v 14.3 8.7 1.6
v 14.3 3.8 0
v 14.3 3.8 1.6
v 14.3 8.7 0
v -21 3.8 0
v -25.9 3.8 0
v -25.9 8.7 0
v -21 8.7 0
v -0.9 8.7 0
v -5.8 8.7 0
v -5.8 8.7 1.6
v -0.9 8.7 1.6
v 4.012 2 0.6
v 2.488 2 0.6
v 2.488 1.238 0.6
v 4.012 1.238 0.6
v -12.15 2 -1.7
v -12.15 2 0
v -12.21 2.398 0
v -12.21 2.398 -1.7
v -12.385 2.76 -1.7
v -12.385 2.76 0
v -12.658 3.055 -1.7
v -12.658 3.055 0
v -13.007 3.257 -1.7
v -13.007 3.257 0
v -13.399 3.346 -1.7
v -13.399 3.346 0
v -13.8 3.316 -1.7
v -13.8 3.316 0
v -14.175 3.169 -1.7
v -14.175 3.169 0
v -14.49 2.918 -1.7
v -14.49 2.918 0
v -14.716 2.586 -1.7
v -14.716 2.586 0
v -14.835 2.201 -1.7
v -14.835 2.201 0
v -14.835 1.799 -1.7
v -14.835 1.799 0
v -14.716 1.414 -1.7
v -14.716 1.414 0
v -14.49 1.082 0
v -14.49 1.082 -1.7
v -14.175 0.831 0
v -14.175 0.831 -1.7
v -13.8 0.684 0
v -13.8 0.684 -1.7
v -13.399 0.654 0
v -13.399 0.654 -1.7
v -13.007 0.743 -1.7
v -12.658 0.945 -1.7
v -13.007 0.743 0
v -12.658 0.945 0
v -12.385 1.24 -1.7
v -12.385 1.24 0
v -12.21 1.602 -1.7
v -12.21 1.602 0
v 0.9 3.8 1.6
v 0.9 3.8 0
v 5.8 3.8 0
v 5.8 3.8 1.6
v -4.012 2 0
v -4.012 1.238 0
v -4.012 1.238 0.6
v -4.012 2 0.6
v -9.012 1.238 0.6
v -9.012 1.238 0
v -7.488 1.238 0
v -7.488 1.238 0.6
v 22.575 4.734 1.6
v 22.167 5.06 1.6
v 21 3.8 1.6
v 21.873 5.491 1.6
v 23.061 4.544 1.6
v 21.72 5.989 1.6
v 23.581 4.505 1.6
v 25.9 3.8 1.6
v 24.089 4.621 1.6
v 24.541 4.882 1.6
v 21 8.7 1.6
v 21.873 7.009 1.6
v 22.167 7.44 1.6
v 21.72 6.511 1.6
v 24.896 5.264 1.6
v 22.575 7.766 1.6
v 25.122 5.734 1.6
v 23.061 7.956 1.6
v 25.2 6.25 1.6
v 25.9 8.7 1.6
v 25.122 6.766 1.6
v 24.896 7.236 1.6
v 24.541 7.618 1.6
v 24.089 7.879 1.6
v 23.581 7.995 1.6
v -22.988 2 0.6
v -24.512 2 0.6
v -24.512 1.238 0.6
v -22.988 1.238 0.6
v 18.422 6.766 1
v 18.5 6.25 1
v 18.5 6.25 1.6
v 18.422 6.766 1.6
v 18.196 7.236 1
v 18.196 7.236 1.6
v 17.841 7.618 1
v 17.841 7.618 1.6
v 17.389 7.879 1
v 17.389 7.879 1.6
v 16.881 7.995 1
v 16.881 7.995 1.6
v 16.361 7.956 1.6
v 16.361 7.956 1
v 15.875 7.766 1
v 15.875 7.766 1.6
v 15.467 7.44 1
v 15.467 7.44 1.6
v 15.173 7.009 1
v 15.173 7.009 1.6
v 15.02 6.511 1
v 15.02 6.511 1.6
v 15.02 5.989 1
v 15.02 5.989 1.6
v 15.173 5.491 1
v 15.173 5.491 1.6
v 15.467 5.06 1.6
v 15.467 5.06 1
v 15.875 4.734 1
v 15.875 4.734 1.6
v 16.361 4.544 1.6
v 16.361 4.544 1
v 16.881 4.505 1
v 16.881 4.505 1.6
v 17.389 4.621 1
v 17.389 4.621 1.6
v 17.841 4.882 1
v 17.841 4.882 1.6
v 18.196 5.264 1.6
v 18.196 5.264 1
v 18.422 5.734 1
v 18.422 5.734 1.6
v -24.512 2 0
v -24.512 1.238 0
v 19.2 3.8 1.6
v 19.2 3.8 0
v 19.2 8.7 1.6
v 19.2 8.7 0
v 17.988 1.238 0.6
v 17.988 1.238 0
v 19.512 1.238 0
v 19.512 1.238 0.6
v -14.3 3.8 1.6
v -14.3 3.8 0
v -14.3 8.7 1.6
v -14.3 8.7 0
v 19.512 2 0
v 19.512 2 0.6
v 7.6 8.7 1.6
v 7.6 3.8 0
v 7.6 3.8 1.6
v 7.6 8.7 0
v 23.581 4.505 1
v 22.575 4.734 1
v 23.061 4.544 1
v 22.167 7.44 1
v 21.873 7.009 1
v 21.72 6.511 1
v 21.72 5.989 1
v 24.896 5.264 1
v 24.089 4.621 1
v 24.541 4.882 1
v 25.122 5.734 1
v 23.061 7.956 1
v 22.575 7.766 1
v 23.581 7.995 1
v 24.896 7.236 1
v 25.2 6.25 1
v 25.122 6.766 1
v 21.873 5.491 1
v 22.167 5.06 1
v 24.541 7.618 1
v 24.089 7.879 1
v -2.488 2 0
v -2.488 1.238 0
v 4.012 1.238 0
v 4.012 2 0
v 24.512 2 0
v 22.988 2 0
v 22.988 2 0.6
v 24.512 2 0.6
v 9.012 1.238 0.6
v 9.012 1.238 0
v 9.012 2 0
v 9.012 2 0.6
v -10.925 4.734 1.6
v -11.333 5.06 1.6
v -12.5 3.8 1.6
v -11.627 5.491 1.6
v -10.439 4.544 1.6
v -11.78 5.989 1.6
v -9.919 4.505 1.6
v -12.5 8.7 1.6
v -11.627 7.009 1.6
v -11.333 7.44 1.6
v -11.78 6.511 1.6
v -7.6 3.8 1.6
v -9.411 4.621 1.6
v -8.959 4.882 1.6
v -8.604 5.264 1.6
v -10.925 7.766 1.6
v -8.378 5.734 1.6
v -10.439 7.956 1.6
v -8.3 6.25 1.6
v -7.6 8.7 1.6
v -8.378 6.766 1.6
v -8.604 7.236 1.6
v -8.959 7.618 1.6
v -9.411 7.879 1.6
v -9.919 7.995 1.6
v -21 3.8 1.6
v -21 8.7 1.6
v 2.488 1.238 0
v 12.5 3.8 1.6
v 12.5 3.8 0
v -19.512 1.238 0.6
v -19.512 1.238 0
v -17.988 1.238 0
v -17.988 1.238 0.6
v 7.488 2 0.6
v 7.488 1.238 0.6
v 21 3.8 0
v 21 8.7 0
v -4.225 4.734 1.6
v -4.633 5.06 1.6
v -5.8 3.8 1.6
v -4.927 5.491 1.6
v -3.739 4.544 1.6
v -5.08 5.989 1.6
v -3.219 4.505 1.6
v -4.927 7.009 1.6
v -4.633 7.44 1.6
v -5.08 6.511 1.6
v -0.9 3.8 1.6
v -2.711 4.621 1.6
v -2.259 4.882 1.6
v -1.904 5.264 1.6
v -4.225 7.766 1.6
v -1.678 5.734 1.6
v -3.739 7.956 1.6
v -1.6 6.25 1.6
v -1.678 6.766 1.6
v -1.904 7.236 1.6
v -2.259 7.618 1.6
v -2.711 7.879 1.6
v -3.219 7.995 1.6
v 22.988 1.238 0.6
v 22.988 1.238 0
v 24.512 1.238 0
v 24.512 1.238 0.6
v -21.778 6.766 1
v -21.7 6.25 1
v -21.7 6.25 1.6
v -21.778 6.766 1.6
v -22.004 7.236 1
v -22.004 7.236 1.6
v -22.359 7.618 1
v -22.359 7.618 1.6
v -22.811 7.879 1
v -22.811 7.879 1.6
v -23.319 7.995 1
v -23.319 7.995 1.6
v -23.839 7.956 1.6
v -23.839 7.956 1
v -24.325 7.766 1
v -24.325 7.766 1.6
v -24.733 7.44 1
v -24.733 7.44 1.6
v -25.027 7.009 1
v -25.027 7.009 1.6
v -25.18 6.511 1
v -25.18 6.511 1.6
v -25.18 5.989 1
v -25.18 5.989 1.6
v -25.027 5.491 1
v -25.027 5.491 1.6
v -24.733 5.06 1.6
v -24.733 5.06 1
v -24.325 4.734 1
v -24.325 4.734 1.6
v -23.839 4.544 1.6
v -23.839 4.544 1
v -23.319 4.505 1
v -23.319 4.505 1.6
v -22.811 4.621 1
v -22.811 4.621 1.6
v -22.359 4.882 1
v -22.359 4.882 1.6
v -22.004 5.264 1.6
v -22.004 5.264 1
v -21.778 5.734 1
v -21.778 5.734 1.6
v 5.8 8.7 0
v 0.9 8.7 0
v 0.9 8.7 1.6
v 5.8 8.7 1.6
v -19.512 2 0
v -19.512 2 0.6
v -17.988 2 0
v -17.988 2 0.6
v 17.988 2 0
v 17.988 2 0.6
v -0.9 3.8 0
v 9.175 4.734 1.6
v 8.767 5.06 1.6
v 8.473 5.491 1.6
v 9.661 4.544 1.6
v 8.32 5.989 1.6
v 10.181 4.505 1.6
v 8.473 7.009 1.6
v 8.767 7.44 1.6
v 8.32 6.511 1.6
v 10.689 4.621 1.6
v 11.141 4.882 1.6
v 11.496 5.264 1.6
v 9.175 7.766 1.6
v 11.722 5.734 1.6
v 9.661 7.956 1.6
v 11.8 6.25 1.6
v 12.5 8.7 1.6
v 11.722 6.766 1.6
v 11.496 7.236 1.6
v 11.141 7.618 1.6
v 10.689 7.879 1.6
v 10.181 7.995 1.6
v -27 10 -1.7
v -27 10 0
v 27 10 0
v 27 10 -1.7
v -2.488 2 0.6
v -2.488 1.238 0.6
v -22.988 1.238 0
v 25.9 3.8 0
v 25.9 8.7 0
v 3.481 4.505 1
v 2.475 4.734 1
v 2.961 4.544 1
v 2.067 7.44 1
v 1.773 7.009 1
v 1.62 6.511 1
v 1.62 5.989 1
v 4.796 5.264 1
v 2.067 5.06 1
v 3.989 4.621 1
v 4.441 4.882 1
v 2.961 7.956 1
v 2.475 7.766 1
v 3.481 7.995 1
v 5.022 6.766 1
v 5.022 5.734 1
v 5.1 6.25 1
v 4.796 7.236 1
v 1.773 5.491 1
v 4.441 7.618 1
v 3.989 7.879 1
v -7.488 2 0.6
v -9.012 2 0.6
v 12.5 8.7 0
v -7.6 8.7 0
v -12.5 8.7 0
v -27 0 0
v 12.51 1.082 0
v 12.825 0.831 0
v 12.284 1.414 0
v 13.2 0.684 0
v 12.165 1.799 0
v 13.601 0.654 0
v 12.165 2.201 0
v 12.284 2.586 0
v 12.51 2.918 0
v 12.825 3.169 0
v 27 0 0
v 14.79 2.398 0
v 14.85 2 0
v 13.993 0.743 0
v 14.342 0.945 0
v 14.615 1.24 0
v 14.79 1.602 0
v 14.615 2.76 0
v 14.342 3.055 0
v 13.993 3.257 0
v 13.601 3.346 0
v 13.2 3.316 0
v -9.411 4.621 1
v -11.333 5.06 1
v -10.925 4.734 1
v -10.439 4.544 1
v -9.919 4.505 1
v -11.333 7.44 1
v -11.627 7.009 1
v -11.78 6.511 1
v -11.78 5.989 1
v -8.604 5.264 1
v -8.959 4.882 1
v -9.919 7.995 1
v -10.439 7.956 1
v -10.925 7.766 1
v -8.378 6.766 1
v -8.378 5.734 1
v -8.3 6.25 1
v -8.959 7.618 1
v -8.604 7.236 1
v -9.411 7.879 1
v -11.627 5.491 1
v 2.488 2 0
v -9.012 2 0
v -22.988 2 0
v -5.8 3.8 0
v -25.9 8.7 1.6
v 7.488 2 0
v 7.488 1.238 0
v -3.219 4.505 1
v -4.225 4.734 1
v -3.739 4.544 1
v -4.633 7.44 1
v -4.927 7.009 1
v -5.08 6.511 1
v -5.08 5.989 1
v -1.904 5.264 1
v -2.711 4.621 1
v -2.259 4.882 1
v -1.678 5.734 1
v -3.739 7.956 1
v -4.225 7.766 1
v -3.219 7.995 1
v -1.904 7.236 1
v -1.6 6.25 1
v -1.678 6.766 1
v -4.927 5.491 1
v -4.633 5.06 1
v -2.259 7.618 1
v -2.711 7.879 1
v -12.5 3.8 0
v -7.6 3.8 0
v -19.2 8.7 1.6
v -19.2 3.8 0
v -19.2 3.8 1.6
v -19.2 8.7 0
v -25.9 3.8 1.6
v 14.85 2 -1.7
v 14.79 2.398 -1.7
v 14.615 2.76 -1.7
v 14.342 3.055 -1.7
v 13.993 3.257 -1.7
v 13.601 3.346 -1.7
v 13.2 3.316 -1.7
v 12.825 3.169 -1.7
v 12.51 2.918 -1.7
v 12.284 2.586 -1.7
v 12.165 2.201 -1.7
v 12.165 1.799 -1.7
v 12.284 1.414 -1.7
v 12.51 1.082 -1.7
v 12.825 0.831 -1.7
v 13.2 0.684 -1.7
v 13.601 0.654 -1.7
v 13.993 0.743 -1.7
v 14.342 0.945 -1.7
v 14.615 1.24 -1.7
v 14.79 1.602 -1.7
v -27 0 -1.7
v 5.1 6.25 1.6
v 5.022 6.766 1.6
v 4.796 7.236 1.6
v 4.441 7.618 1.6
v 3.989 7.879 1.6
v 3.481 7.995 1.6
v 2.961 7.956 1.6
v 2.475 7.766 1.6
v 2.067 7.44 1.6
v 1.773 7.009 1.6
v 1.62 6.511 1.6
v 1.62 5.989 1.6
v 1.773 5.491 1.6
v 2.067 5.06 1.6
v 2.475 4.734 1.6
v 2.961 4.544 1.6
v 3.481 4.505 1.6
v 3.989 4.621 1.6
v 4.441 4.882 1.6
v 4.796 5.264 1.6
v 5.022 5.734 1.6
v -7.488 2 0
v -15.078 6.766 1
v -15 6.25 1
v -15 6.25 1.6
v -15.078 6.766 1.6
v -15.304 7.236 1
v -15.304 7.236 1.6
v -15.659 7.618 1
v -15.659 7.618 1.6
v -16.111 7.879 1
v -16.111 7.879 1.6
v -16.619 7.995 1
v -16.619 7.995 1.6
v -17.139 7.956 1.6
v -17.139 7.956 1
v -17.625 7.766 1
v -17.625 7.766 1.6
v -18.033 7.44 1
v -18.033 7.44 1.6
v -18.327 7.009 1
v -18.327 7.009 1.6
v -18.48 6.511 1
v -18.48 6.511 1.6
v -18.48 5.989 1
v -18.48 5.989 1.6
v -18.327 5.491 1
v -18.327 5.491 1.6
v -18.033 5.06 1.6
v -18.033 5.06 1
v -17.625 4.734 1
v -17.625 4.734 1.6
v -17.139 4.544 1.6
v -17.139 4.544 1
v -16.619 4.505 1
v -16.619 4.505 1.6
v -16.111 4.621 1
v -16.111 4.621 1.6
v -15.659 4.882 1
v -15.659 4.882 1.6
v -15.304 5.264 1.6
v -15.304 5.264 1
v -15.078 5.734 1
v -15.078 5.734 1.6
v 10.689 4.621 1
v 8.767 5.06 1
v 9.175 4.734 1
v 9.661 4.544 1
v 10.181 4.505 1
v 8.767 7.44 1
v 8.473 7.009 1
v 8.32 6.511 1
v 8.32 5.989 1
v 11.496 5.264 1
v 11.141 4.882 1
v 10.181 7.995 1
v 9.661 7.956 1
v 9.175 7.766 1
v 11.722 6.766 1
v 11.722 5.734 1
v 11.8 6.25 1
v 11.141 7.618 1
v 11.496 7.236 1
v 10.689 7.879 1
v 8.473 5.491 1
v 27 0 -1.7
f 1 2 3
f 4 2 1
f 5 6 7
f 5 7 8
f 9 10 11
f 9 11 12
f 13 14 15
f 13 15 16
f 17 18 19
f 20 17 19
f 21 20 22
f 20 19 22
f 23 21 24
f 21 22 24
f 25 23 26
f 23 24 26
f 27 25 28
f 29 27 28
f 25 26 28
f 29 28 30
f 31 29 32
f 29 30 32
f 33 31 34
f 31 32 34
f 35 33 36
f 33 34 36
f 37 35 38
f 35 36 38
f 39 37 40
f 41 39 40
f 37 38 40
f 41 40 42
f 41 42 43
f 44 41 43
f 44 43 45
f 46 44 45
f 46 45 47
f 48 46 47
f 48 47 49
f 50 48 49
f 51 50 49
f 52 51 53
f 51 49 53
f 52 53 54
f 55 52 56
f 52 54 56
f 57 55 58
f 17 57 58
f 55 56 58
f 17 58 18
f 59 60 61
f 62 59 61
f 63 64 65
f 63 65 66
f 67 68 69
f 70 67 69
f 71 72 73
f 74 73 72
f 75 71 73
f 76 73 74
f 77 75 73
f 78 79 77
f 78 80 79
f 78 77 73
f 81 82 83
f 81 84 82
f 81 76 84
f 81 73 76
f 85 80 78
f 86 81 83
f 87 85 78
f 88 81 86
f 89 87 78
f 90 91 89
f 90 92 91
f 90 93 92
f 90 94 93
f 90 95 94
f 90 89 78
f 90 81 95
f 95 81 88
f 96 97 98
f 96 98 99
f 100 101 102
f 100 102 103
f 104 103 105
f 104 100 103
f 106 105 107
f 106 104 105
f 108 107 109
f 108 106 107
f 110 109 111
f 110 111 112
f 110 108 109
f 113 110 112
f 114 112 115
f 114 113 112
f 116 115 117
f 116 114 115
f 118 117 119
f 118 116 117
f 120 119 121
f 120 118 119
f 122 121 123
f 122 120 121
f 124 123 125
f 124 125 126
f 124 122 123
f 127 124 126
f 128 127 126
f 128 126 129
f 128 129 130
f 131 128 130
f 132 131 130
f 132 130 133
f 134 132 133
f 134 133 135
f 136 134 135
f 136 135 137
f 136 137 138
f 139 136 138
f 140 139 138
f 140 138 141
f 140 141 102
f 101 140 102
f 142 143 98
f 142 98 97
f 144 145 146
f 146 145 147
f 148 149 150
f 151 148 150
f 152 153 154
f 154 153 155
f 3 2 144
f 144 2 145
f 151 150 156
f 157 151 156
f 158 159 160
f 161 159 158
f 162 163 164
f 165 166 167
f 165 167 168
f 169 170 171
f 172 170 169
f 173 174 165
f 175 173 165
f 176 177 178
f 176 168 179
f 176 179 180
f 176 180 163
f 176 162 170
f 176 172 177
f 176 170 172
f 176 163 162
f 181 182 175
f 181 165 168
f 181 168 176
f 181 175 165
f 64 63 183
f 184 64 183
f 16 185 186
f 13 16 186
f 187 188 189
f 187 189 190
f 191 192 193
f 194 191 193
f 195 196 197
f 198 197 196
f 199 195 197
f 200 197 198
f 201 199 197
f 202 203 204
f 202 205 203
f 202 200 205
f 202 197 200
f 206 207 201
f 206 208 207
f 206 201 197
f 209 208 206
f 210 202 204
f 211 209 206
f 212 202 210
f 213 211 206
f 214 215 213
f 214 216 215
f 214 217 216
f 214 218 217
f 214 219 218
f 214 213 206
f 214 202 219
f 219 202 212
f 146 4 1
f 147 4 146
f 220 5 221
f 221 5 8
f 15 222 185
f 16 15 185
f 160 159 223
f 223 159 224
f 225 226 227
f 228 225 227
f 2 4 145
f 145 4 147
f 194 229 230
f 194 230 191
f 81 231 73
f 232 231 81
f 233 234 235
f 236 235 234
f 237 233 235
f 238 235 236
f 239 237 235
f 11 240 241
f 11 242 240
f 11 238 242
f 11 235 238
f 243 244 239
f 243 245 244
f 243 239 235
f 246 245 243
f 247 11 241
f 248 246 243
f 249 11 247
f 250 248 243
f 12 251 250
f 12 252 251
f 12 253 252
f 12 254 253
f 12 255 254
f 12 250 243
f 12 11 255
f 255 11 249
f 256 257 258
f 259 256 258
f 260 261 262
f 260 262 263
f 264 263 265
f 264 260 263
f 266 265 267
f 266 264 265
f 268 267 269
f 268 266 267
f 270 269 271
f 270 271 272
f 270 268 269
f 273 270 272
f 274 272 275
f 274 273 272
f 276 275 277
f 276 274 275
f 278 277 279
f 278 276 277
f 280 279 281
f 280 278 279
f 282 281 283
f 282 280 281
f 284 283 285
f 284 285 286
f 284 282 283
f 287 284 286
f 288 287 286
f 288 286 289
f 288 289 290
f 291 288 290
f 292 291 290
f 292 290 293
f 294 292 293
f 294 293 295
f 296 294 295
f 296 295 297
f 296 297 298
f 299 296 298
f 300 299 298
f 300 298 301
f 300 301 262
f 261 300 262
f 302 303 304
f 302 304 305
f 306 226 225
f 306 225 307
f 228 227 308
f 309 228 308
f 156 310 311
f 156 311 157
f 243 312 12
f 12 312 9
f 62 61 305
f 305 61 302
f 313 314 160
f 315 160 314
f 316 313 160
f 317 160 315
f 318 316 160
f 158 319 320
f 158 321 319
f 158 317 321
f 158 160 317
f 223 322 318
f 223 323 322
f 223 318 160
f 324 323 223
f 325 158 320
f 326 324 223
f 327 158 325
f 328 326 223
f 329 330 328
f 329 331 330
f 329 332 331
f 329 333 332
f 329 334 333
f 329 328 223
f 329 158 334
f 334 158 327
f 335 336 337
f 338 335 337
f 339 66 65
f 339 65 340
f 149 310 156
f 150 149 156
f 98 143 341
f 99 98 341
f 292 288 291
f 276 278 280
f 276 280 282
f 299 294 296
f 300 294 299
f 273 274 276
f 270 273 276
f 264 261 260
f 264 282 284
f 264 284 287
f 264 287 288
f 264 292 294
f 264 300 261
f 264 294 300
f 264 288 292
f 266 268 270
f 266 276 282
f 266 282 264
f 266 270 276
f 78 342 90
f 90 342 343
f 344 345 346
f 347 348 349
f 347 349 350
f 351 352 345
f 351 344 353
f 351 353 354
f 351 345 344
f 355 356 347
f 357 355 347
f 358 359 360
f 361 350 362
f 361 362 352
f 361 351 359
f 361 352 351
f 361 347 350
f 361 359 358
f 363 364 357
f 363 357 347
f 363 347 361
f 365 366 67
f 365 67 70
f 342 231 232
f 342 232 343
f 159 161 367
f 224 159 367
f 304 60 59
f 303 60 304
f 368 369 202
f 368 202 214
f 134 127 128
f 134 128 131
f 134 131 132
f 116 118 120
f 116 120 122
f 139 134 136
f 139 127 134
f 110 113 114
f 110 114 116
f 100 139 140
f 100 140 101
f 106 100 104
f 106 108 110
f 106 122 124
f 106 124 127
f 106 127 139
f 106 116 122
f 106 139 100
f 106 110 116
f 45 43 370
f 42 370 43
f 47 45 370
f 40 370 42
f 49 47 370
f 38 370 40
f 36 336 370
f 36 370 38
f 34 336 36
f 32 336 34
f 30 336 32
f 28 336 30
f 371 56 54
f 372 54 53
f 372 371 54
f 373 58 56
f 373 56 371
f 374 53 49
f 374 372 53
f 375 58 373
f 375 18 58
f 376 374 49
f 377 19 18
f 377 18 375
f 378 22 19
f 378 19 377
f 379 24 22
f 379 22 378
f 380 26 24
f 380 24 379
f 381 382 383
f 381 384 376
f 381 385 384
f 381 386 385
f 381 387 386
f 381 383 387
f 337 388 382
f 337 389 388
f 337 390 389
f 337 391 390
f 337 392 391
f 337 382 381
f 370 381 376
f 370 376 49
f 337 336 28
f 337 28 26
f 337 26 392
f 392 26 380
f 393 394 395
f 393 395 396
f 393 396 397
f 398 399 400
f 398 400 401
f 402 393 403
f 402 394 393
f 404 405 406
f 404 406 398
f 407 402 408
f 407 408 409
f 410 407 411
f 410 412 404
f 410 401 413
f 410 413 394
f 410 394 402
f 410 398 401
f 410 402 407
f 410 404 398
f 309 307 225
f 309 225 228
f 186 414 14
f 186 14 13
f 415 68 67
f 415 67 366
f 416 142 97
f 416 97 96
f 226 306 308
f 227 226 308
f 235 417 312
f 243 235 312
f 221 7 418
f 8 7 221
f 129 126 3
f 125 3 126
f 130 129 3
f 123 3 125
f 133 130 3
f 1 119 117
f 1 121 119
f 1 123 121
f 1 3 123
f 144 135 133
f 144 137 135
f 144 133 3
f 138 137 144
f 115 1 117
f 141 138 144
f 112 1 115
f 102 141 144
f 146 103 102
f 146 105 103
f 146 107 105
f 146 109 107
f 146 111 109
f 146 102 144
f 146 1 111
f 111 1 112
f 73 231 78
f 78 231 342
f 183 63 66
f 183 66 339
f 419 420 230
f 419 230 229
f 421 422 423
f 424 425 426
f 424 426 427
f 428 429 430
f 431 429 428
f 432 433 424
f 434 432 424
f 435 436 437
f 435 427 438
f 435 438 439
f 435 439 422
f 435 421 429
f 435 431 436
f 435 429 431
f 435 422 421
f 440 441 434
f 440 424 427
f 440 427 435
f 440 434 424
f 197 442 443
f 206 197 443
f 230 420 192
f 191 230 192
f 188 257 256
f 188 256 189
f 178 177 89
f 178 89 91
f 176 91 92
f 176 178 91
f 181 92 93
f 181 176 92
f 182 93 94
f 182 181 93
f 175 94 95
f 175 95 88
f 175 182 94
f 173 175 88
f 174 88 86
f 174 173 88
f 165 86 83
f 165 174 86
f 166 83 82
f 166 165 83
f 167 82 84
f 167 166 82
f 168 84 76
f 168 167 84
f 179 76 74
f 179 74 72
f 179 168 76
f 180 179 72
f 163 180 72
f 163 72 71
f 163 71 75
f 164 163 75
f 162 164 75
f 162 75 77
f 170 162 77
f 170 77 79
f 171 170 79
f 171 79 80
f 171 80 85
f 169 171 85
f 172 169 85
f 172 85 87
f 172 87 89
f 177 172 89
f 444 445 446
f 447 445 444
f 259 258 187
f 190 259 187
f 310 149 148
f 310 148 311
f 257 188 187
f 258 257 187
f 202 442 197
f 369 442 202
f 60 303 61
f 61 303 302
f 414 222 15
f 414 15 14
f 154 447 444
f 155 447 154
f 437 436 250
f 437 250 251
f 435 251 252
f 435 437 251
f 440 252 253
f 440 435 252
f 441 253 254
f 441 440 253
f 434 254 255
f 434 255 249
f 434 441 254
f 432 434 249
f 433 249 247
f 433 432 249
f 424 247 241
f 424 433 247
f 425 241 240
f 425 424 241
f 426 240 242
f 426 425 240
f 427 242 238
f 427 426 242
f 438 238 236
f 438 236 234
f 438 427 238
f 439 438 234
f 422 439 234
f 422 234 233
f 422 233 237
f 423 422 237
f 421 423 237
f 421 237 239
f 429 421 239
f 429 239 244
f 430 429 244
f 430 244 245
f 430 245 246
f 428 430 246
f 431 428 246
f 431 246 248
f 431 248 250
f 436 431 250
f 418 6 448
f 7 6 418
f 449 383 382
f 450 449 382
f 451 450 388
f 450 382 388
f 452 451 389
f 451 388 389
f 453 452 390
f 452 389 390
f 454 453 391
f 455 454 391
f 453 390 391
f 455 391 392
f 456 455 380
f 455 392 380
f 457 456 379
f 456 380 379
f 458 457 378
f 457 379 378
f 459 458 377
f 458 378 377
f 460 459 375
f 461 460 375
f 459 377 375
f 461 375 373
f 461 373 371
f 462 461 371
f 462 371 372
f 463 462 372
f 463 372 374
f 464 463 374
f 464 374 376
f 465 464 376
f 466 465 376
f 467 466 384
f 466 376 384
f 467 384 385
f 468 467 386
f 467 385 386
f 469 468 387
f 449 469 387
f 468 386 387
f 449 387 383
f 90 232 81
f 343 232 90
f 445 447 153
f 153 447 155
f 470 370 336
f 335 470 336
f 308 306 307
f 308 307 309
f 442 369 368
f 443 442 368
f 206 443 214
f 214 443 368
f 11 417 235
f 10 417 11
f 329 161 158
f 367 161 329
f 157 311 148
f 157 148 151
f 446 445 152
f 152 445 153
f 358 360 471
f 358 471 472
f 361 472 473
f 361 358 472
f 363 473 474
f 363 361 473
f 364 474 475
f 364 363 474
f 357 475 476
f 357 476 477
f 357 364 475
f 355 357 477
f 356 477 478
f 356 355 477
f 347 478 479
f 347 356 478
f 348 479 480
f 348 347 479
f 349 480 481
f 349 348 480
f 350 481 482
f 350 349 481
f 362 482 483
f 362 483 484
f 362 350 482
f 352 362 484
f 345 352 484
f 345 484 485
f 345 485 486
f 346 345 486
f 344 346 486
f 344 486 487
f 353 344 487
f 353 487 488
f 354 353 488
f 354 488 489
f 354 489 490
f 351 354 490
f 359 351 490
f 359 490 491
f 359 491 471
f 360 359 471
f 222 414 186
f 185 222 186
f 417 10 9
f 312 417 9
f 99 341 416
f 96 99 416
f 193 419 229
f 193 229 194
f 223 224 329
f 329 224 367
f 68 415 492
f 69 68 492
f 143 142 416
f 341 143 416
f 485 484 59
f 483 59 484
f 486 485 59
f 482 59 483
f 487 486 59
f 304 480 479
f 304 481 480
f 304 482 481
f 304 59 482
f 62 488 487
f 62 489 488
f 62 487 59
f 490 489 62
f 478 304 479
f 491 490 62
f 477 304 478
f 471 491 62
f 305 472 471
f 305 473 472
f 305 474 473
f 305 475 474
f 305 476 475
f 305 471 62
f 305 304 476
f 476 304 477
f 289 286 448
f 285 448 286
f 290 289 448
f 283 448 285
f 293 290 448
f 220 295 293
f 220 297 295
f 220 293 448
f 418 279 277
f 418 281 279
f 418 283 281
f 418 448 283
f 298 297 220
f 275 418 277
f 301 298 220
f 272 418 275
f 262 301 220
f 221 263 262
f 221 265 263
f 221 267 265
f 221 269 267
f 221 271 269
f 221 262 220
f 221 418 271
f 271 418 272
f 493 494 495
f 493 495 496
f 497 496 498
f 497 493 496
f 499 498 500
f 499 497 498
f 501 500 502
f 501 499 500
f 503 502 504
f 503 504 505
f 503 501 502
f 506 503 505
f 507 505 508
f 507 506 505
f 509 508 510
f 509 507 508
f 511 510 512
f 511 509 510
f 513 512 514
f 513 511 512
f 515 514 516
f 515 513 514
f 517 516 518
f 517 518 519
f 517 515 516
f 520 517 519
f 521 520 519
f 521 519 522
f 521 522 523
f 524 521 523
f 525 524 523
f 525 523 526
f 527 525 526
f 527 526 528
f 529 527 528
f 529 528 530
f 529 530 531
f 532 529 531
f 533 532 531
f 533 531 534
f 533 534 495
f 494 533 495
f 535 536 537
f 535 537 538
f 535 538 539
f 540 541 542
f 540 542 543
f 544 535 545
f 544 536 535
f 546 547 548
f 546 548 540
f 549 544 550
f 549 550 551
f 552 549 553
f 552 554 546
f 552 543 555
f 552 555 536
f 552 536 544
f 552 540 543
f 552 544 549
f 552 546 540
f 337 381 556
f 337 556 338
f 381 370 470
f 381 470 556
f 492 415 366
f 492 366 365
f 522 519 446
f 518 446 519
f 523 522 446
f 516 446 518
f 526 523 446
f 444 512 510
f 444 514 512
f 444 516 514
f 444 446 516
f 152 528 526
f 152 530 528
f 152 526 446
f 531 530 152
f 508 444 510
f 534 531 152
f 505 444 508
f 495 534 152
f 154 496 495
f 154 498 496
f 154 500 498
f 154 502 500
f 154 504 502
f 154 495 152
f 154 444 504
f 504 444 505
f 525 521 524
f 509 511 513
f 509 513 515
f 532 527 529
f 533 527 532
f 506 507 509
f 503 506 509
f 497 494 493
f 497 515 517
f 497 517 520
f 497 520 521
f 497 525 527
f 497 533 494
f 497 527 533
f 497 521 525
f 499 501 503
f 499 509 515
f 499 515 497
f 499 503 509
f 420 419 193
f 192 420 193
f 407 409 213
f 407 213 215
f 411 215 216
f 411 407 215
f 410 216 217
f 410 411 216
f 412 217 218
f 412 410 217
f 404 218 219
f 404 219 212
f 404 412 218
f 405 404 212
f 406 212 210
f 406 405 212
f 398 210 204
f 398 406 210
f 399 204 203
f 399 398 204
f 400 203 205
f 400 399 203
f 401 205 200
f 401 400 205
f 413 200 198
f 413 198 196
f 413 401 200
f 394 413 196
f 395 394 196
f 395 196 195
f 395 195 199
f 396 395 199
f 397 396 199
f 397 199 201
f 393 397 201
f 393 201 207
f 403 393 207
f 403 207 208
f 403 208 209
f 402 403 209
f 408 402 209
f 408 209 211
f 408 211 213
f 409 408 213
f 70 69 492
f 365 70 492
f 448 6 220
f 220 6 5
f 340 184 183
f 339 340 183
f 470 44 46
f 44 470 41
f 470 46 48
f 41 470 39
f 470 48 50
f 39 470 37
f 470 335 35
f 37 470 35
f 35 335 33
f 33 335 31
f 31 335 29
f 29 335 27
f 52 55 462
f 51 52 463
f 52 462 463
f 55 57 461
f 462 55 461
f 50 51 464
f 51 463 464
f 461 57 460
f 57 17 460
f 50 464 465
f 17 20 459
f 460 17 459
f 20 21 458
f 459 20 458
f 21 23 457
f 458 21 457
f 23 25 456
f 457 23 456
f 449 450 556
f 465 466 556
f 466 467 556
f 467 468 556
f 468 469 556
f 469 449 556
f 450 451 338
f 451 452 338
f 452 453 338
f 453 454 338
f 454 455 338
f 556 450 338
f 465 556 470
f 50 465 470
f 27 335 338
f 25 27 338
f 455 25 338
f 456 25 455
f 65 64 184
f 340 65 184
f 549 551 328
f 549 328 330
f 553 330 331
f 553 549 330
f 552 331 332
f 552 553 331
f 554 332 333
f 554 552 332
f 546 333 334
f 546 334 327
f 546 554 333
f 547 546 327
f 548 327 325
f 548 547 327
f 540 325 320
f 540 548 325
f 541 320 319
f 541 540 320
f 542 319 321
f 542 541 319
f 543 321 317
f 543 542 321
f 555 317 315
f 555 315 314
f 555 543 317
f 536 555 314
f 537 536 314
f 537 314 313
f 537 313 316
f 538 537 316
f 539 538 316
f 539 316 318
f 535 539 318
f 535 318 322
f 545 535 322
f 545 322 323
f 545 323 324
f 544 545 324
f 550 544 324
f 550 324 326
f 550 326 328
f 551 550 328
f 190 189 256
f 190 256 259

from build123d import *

# Parameters (mm, degrees)
F0_W     = 54
F0_H     = 10
F0_R     = 1.35
F2_DEPTH = 1.7
F1_W     = 4.9
F1_H     = 4.9
F1_R     = 1.75
F3_DEPTH = 1.6
F4_DEPTH = 1
F1_W_2   = 1.524
F1_H_2   = 0.762
F5_DEPTH = 0.6


with BuildPart() as f2:
    # F0 (on Top) → F2 (new body)
    with BuildSketch(Plane.XY):
        with Locations((0, 5)):
            Rectangle(F0_W, F0_H)
        with Locations((-13.5, 2)):
            Circle(F0_R, mode=Mode.SUBTRACT)
        with Locations((13.5, 2)):
            Circle(F0_R, mode=Mode.SUBTRACT)
    extrude(amount=-F2_DEPTH)


with BuildPart() as f3:
    # F1 (on Top) → F3 (new body)
    with BuildSketch(Plane.XY):
        with Locations((-23.45, 6.25)):
            Rectangle(F1_W, F1_H)
        with Locations((-23.45, 6.25)):
            Circle(F1_R, mode=Mode.SUBTRACT)
    extrude(amount=F3_DEPTH)

    # F1 (on Top) → F4, piece 8 (join)
    with BuildSketch(Plane.XY):
        with Locations((-23.45, 6.25)):
            Circle(F1_R)
    extrude(amount=F4_DEPTH)


with BuildPart() as f3b:
    # F1 (on Top) → F3, piece 2 (new body)
    with BuildSketch(Plane.XY):
        with Locations((-16.75, 6.25)):
            Rectangle(F1_W, F1_H)
        with Locations((-16.75, 6.25)):
            Circle(F1_R, mode=Mode.SUBTRACT)
    extrude(amount=F3_DEPTH)

    # F1 (on Top) → F4, piece 7 (join)
    with BuildSketch(Plane.XY):
        with Locations((-16.75, 6.25)):
            Circle(F1_R)
    extrude(amount=F4_DEPTH)


with BuildPart() as f3c:
    # F1 (on Top) → F3, piece 3 (new body)
    with BuildSketch(Plane.XY):
        with Locations((-10.05, 6.25)):
            Rectangle(F1_W, F1_H)
        with Locations((-10.05, 6.25)):
            Circle(F1_R, mode=Mode.SUBTRACT)
    extrude(amount=F3_DEPTH)

    # F1 (on Top) → F4, piece 6 (join)
    with BuildSketch(Plane.XY):
        with Locations((-10.05, 6.25)):
            Circle(F1_R)
    extrude(amount=F4_DEPTH)


with BuildPart() as f3d:
    # F1 (on Top) → F3, piece 4 (new body)
    with BuildSketch(Plane.XY):
        with Locations((-3.35, 6.25)):
            Rectangle(F1_W, F1_H)
        with Locations((-3.35, 6.25)):
            Circle(F1_R, mode=Mode.SUBTRACT)
    extrude(amount=F3_DEPTH)

    # F1 (on Top) → F4, piece 5 (join)
    with BuildSketch(Plane.XY):
        with Locations((-3.35, 6.25)):
            Circle(F1_R)
    extrude(amount=F4_DEPTH)


with BuildPart() as f3e:
    # F1 (on Top) → F3, piece 5 (new body)
    with BuildSketch(Plane.XY):
        with Locations((3.35, 6.25)):
            Rectangle(F1_W, F1_H)
        with Locations((3.35, 6.25)):
            Circle(F1_R, mode=Mode.SUBTRACT)
    extrude(amount=F3_DEPTH)

    # F1 (on Top) → F4, piece 4 (join)
    with BuildSketch(Plane.XY):
        with Locations((3.35, 6.25)):
            Circle(F1_R)
    extrude(amount=F4_DEPTH)


with BuildPart() as f3f:
    # F1 (on Top) → F3, piece 6 (new body)
    with BuildSketch(Plane.XY):
        with Locations((10.05, 6.25)):
            Rectangle(F1_W, F1_H)
        with Locations((10.05, 6.25)):
            Circle(F1_R, mode=Mode.SUBTRACT)
    extrude(amount=F3_DEPTH)

    # F1 (on Top) → F4, piece 3 (join)
    with BuildSketch(Plane.XY):
        with Locations((10.05, 6.25)):
            Circle(F1_R)
    extrude(amount=F4_DEPTH)


with BuildPart() as f3g:
    # F1 (on Top) → F3, piece 7 (new body)
    with BuildSketch(Plane.XY):
        with Locations((16.75, 6.25)):
            Rectangle(F1_W, F1_H)
        with Locations((16.75, 6.25)):
            Circle(F1_R, mode=Mode.SUBTRACT)
    extrude(amount=F3_DEPTH)

    # F1 (on Top) → F4, piece 2 (join)
    with BuildSketch(Plane.XY):
        with Locations((16.75, 6.25)):
            Circle(F1_R)
    extrude(amount=F4_DEPTH)


with BuildPart() as f3h:
    # F1 (on Top) → F3, piece 8 (new body)
    with BuildSketch(Plane.XY):
        with Locations((23.45, 6.25)):
            Rectangle(F1_W, F1_H)
        with Locations((23.45, 6.25)):
            Circle(F1_R, mode=Mode.SUBTRACT)
    extrude(amount=F3_DEPTH)

    # F1 (on Top) → F4 (join)
    with BuildSketch(Plane.XY):
        with Locations((23.45, 6.25)):
            Circle(F1_R)
    extrude(amount=F4_DEPTH)


with BuildPart() as f5:
    # F1 (on Top) → F5 (new body)
    with BuildSketch(Plane.XY):
        with Locations((23.75, 1.619)):
            Rectangle(F1_W_2, F1_H_2)
    extrude(amount=F5_DEPTH)


with BuildPart() as f5b:
    # F1 (on Top) → F5, piece 2 (new body)
    with BuildSketch(Plane.XY):
        with Locations((18.75, 1.619)):
            Rectangle(F1_W_2, F1_H_2)
    extrude(amount=F5_DEPTH)


with BuildPart() as f5c:
    # F1 (on Top) → F5, piece 3 (new body)
    with BuildSketch(Plane.XY):
        with Locations((8.25, 1.619)):
            Rectangle(F1_W_2, F1_H_2)
    extrude(amount=F5_DEPTH)


with BuildPart() as f5d:
    # F1 (on Top) → F5, piece 4 (new body)
    with BuildSketch(Plane.XY):
        with Locations((3.25, 1.619)):
            Rectangle(F1_W_2, F1_H_2)
    extrude(amount=F5_DEPTH)


with BuildPart() as f5e:
    # F1 (on Top) → F5, piece 5 (new body)
    with BuildSketch(Plane.XY):
        with Locations((-3.25, 1.619)):
            Rectangle(F1_W_2, F1_H_2)
    extrude(amount=F5_DEPTH)


with BuildPart() as f5f:
    # F1 (on Top) → F5, piece 6 (new body)
    with BuildSketch(Plane.XY):
        with Locations((-8.25, 1.619)):
            Rectangle(F1_W_2, F1_H_2)
    extrude(amount=F5_DEPTH)


with BuildPart() as f5g:
    # F1 (on Top) → F5, piece 7 (new body)
    with BuildSketch(Plane.XY):
        with Locations((-18.75, 1.619)):
            Rectangle(F1_W_2, F1_H_2)
    extrude(amount=F5_DEPTH)


with BuildPart() as f5h:
    # F1 (on Top) → F5, piece 8 (new body)
    with BuildSketch(Plane.XY):
        with Locations((-23.75, 1.619)):
            Rectangle(F1_W_2, F1_H_2)
    extrude(amount=F5_DEPTH)


solid = Compound([f2.part, f3.part, f3b.part, f3c.part, f3d.part, f3e.part, f3f.part, f3g.part, f3h.part, f5.part, f5b.part, f5c.part, f5d.part, f5e.part, f5f.part, f5g.part, f5h.part])
